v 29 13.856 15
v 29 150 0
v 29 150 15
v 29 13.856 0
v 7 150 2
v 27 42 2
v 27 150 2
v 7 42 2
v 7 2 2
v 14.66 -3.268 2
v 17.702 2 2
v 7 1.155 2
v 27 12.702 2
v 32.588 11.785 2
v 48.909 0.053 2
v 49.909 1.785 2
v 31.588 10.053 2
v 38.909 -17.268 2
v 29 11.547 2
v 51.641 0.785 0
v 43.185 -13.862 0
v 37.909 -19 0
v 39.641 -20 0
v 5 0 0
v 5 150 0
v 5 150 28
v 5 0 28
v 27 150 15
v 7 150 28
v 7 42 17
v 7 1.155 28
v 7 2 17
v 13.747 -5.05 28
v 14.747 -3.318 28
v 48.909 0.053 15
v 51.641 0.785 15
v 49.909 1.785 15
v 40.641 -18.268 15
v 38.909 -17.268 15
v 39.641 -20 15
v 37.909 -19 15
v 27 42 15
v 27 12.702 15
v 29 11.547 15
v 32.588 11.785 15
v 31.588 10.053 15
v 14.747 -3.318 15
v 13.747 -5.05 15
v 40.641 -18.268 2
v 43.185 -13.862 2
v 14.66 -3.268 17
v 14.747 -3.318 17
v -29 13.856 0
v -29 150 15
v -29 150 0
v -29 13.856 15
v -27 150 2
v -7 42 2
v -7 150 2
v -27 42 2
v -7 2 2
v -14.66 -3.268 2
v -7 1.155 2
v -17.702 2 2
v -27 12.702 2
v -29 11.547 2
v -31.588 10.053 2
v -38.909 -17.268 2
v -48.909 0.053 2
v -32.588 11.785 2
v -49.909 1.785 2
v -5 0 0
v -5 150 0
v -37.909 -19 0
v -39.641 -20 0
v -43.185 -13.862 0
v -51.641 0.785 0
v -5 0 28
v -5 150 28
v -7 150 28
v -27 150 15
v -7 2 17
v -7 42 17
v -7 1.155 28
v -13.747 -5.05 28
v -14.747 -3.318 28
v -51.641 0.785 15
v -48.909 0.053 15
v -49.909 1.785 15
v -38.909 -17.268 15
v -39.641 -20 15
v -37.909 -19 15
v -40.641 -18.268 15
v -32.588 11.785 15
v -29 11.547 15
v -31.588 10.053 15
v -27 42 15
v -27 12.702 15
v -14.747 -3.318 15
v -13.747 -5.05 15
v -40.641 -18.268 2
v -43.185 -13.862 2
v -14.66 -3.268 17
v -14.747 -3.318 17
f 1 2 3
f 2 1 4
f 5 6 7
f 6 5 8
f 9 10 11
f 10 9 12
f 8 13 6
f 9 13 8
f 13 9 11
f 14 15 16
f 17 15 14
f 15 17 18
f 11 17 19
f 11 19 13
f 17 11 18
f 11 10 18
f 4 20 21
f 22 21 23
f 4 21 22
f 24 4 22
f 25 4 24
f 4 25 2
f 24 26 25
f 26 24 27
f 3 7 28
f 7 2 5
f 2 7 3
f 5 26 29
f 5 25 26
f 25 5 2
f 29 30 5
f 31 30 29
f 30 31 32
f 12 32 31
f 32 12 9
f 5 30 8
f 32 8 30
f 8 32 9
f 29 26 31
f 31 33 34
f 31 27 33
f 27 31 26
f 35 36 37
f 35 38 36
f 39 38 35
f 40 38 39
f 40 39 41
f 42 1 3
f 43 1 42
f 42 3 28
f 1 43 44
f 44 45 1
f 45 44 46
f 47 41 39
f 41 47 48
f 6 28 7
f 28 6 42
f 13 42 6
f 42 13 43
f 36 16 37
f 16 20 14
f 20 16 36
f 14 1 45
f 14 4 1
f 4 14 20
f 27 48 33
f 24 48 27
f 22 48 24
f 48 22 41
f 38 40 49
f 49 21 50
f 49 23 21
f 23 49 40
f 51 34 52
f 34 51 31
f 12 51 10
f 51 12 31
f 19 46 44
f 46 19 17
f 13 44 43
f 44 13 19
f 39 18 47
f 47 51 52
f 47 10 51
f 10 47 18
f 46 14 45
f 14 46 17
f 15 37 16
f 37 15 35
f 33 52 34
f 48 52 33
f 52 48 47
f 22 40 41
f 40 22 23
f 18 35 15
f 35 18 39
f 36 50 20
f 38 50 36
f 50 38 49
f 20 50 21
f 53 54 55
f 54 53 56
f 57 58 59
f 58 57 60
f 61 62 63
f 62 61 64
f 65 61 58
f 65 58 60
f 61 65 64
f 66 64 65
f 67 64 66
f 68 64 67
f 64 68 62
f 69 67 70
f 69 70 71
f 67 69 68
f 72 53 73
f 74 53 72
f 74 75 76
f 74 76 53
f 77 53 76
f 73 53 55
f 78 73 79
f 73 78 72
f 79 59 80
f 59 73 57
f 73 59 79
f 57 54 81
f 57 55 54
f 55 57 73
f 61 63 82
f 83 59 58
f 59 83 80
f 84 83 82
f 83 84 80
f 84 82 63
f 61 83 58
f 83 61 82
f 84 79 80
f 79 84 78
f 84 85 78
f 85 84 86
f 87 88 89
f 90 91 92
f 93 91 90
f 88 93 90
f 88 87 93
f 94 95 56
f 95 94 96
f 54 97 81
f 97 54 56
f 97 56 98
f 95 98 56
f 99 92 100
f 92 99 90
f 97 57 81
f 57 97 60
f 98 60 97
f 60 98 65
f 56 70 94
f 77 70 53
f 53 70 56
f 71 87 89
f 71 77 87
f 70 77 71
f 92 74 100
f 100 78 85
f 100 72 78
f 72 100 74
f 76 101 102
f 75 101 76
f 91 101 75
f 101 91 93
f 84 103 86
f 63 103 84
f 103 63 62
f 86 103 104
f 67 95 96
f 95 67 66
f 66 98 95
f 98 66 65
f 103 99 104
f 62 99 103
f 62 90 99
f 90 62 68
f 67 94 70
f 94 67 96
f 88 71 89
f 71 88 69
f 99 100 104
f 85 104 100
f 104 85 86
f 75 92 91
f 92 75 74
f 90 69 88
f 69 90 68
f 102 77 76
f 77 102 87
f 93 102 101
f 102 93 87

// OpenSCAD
// file: detail/battery.scad
module batteryAA()
{
  cylinder(h=48.5, r=14.5/2, $fs=0.1);
  translate([0,0, 48.5])
    cylinder(h=2, r=5.5/2, $fs=0.1);
}

module batteryAAA()
{
  cylinder(h=42.5, r=10.5/2, $fs=0.1);
  translate([0,0, 42.5])
    cylinder(h=1.5, r=4/2, $fs=0.1);
}

// just an exhibition - not used directly
translate([20,0,0])
  batteryAA();
translate([0,0,0])
  batteryAAA();
// file: detail/wing.scad
use <battery.scad>

surround        = 15;
height          = 150;
wall            = 2;
// following shall be defined before including module
//batteryDiameter = 20;
//batteryLength   = 40;

module channel(h)
{
  // side
  cube([2*wall+batteryDiameter, h, wall]);
  // back wall
  cube([wall, h, batteryLength/2]);
  // front holding
  translate([wall+batteryDiameter, 0, 0])
    cube([wall, h, surround]);
}

module wing()
{
  difference()
  {
    // main channel part
    union()
    {
      channel(height);
      rotate([0,0,60])
        translate([0, -2*batteryDiameter, 0])
          channel(2*batteryDiameter);
    }
    // removal of unnecessary elements
    translate([wall, wall, wall])
      cube([batteryDiameter, 2*batteryDiameter, surround]);
    rotate([0,0,60])
      translate([wall, -2*batteryDiameter, wall])
        cube([batteryDiameter, 1.5*batteryDiameter, surround]);
    // removal of part from which battery will be extracted
    rotate([0,0,60])
      translate([3*wall, -2*batteryDiameter+wall, wall])
        cube([batteryDiameter, batteryDiameter, surround]);
    // extra space on the bottom for the fingers to catch the battery easily
    rotate([0,0,60])
      translate([-0.1, -2*batteryDiameter-0.1, surround])
        cube([batteryDiameter, 1.5*batteryDiameter, batteryLength/2-surround]);
  }
  rotate([0,0,60])
    translate([0, -2*batteryDiameter, 0])
      cube([2*wall+batteryDiameter, wall, surround]);
}


// display only
if(false)
  for(m = [0,1])
    mirror([m,0,0])
      translate([5,0,0])
        wing();
// main file
batteryDiameter = 20;
batteryLength   = 56;
include <detail/wing.scad>

for(m = [0,1])
{
  mirror([m,0,0])
  {
    translate([5,0,0])
      wing();
    %translate([35, -3, 2+1])
      batteryAA();
  }
}
